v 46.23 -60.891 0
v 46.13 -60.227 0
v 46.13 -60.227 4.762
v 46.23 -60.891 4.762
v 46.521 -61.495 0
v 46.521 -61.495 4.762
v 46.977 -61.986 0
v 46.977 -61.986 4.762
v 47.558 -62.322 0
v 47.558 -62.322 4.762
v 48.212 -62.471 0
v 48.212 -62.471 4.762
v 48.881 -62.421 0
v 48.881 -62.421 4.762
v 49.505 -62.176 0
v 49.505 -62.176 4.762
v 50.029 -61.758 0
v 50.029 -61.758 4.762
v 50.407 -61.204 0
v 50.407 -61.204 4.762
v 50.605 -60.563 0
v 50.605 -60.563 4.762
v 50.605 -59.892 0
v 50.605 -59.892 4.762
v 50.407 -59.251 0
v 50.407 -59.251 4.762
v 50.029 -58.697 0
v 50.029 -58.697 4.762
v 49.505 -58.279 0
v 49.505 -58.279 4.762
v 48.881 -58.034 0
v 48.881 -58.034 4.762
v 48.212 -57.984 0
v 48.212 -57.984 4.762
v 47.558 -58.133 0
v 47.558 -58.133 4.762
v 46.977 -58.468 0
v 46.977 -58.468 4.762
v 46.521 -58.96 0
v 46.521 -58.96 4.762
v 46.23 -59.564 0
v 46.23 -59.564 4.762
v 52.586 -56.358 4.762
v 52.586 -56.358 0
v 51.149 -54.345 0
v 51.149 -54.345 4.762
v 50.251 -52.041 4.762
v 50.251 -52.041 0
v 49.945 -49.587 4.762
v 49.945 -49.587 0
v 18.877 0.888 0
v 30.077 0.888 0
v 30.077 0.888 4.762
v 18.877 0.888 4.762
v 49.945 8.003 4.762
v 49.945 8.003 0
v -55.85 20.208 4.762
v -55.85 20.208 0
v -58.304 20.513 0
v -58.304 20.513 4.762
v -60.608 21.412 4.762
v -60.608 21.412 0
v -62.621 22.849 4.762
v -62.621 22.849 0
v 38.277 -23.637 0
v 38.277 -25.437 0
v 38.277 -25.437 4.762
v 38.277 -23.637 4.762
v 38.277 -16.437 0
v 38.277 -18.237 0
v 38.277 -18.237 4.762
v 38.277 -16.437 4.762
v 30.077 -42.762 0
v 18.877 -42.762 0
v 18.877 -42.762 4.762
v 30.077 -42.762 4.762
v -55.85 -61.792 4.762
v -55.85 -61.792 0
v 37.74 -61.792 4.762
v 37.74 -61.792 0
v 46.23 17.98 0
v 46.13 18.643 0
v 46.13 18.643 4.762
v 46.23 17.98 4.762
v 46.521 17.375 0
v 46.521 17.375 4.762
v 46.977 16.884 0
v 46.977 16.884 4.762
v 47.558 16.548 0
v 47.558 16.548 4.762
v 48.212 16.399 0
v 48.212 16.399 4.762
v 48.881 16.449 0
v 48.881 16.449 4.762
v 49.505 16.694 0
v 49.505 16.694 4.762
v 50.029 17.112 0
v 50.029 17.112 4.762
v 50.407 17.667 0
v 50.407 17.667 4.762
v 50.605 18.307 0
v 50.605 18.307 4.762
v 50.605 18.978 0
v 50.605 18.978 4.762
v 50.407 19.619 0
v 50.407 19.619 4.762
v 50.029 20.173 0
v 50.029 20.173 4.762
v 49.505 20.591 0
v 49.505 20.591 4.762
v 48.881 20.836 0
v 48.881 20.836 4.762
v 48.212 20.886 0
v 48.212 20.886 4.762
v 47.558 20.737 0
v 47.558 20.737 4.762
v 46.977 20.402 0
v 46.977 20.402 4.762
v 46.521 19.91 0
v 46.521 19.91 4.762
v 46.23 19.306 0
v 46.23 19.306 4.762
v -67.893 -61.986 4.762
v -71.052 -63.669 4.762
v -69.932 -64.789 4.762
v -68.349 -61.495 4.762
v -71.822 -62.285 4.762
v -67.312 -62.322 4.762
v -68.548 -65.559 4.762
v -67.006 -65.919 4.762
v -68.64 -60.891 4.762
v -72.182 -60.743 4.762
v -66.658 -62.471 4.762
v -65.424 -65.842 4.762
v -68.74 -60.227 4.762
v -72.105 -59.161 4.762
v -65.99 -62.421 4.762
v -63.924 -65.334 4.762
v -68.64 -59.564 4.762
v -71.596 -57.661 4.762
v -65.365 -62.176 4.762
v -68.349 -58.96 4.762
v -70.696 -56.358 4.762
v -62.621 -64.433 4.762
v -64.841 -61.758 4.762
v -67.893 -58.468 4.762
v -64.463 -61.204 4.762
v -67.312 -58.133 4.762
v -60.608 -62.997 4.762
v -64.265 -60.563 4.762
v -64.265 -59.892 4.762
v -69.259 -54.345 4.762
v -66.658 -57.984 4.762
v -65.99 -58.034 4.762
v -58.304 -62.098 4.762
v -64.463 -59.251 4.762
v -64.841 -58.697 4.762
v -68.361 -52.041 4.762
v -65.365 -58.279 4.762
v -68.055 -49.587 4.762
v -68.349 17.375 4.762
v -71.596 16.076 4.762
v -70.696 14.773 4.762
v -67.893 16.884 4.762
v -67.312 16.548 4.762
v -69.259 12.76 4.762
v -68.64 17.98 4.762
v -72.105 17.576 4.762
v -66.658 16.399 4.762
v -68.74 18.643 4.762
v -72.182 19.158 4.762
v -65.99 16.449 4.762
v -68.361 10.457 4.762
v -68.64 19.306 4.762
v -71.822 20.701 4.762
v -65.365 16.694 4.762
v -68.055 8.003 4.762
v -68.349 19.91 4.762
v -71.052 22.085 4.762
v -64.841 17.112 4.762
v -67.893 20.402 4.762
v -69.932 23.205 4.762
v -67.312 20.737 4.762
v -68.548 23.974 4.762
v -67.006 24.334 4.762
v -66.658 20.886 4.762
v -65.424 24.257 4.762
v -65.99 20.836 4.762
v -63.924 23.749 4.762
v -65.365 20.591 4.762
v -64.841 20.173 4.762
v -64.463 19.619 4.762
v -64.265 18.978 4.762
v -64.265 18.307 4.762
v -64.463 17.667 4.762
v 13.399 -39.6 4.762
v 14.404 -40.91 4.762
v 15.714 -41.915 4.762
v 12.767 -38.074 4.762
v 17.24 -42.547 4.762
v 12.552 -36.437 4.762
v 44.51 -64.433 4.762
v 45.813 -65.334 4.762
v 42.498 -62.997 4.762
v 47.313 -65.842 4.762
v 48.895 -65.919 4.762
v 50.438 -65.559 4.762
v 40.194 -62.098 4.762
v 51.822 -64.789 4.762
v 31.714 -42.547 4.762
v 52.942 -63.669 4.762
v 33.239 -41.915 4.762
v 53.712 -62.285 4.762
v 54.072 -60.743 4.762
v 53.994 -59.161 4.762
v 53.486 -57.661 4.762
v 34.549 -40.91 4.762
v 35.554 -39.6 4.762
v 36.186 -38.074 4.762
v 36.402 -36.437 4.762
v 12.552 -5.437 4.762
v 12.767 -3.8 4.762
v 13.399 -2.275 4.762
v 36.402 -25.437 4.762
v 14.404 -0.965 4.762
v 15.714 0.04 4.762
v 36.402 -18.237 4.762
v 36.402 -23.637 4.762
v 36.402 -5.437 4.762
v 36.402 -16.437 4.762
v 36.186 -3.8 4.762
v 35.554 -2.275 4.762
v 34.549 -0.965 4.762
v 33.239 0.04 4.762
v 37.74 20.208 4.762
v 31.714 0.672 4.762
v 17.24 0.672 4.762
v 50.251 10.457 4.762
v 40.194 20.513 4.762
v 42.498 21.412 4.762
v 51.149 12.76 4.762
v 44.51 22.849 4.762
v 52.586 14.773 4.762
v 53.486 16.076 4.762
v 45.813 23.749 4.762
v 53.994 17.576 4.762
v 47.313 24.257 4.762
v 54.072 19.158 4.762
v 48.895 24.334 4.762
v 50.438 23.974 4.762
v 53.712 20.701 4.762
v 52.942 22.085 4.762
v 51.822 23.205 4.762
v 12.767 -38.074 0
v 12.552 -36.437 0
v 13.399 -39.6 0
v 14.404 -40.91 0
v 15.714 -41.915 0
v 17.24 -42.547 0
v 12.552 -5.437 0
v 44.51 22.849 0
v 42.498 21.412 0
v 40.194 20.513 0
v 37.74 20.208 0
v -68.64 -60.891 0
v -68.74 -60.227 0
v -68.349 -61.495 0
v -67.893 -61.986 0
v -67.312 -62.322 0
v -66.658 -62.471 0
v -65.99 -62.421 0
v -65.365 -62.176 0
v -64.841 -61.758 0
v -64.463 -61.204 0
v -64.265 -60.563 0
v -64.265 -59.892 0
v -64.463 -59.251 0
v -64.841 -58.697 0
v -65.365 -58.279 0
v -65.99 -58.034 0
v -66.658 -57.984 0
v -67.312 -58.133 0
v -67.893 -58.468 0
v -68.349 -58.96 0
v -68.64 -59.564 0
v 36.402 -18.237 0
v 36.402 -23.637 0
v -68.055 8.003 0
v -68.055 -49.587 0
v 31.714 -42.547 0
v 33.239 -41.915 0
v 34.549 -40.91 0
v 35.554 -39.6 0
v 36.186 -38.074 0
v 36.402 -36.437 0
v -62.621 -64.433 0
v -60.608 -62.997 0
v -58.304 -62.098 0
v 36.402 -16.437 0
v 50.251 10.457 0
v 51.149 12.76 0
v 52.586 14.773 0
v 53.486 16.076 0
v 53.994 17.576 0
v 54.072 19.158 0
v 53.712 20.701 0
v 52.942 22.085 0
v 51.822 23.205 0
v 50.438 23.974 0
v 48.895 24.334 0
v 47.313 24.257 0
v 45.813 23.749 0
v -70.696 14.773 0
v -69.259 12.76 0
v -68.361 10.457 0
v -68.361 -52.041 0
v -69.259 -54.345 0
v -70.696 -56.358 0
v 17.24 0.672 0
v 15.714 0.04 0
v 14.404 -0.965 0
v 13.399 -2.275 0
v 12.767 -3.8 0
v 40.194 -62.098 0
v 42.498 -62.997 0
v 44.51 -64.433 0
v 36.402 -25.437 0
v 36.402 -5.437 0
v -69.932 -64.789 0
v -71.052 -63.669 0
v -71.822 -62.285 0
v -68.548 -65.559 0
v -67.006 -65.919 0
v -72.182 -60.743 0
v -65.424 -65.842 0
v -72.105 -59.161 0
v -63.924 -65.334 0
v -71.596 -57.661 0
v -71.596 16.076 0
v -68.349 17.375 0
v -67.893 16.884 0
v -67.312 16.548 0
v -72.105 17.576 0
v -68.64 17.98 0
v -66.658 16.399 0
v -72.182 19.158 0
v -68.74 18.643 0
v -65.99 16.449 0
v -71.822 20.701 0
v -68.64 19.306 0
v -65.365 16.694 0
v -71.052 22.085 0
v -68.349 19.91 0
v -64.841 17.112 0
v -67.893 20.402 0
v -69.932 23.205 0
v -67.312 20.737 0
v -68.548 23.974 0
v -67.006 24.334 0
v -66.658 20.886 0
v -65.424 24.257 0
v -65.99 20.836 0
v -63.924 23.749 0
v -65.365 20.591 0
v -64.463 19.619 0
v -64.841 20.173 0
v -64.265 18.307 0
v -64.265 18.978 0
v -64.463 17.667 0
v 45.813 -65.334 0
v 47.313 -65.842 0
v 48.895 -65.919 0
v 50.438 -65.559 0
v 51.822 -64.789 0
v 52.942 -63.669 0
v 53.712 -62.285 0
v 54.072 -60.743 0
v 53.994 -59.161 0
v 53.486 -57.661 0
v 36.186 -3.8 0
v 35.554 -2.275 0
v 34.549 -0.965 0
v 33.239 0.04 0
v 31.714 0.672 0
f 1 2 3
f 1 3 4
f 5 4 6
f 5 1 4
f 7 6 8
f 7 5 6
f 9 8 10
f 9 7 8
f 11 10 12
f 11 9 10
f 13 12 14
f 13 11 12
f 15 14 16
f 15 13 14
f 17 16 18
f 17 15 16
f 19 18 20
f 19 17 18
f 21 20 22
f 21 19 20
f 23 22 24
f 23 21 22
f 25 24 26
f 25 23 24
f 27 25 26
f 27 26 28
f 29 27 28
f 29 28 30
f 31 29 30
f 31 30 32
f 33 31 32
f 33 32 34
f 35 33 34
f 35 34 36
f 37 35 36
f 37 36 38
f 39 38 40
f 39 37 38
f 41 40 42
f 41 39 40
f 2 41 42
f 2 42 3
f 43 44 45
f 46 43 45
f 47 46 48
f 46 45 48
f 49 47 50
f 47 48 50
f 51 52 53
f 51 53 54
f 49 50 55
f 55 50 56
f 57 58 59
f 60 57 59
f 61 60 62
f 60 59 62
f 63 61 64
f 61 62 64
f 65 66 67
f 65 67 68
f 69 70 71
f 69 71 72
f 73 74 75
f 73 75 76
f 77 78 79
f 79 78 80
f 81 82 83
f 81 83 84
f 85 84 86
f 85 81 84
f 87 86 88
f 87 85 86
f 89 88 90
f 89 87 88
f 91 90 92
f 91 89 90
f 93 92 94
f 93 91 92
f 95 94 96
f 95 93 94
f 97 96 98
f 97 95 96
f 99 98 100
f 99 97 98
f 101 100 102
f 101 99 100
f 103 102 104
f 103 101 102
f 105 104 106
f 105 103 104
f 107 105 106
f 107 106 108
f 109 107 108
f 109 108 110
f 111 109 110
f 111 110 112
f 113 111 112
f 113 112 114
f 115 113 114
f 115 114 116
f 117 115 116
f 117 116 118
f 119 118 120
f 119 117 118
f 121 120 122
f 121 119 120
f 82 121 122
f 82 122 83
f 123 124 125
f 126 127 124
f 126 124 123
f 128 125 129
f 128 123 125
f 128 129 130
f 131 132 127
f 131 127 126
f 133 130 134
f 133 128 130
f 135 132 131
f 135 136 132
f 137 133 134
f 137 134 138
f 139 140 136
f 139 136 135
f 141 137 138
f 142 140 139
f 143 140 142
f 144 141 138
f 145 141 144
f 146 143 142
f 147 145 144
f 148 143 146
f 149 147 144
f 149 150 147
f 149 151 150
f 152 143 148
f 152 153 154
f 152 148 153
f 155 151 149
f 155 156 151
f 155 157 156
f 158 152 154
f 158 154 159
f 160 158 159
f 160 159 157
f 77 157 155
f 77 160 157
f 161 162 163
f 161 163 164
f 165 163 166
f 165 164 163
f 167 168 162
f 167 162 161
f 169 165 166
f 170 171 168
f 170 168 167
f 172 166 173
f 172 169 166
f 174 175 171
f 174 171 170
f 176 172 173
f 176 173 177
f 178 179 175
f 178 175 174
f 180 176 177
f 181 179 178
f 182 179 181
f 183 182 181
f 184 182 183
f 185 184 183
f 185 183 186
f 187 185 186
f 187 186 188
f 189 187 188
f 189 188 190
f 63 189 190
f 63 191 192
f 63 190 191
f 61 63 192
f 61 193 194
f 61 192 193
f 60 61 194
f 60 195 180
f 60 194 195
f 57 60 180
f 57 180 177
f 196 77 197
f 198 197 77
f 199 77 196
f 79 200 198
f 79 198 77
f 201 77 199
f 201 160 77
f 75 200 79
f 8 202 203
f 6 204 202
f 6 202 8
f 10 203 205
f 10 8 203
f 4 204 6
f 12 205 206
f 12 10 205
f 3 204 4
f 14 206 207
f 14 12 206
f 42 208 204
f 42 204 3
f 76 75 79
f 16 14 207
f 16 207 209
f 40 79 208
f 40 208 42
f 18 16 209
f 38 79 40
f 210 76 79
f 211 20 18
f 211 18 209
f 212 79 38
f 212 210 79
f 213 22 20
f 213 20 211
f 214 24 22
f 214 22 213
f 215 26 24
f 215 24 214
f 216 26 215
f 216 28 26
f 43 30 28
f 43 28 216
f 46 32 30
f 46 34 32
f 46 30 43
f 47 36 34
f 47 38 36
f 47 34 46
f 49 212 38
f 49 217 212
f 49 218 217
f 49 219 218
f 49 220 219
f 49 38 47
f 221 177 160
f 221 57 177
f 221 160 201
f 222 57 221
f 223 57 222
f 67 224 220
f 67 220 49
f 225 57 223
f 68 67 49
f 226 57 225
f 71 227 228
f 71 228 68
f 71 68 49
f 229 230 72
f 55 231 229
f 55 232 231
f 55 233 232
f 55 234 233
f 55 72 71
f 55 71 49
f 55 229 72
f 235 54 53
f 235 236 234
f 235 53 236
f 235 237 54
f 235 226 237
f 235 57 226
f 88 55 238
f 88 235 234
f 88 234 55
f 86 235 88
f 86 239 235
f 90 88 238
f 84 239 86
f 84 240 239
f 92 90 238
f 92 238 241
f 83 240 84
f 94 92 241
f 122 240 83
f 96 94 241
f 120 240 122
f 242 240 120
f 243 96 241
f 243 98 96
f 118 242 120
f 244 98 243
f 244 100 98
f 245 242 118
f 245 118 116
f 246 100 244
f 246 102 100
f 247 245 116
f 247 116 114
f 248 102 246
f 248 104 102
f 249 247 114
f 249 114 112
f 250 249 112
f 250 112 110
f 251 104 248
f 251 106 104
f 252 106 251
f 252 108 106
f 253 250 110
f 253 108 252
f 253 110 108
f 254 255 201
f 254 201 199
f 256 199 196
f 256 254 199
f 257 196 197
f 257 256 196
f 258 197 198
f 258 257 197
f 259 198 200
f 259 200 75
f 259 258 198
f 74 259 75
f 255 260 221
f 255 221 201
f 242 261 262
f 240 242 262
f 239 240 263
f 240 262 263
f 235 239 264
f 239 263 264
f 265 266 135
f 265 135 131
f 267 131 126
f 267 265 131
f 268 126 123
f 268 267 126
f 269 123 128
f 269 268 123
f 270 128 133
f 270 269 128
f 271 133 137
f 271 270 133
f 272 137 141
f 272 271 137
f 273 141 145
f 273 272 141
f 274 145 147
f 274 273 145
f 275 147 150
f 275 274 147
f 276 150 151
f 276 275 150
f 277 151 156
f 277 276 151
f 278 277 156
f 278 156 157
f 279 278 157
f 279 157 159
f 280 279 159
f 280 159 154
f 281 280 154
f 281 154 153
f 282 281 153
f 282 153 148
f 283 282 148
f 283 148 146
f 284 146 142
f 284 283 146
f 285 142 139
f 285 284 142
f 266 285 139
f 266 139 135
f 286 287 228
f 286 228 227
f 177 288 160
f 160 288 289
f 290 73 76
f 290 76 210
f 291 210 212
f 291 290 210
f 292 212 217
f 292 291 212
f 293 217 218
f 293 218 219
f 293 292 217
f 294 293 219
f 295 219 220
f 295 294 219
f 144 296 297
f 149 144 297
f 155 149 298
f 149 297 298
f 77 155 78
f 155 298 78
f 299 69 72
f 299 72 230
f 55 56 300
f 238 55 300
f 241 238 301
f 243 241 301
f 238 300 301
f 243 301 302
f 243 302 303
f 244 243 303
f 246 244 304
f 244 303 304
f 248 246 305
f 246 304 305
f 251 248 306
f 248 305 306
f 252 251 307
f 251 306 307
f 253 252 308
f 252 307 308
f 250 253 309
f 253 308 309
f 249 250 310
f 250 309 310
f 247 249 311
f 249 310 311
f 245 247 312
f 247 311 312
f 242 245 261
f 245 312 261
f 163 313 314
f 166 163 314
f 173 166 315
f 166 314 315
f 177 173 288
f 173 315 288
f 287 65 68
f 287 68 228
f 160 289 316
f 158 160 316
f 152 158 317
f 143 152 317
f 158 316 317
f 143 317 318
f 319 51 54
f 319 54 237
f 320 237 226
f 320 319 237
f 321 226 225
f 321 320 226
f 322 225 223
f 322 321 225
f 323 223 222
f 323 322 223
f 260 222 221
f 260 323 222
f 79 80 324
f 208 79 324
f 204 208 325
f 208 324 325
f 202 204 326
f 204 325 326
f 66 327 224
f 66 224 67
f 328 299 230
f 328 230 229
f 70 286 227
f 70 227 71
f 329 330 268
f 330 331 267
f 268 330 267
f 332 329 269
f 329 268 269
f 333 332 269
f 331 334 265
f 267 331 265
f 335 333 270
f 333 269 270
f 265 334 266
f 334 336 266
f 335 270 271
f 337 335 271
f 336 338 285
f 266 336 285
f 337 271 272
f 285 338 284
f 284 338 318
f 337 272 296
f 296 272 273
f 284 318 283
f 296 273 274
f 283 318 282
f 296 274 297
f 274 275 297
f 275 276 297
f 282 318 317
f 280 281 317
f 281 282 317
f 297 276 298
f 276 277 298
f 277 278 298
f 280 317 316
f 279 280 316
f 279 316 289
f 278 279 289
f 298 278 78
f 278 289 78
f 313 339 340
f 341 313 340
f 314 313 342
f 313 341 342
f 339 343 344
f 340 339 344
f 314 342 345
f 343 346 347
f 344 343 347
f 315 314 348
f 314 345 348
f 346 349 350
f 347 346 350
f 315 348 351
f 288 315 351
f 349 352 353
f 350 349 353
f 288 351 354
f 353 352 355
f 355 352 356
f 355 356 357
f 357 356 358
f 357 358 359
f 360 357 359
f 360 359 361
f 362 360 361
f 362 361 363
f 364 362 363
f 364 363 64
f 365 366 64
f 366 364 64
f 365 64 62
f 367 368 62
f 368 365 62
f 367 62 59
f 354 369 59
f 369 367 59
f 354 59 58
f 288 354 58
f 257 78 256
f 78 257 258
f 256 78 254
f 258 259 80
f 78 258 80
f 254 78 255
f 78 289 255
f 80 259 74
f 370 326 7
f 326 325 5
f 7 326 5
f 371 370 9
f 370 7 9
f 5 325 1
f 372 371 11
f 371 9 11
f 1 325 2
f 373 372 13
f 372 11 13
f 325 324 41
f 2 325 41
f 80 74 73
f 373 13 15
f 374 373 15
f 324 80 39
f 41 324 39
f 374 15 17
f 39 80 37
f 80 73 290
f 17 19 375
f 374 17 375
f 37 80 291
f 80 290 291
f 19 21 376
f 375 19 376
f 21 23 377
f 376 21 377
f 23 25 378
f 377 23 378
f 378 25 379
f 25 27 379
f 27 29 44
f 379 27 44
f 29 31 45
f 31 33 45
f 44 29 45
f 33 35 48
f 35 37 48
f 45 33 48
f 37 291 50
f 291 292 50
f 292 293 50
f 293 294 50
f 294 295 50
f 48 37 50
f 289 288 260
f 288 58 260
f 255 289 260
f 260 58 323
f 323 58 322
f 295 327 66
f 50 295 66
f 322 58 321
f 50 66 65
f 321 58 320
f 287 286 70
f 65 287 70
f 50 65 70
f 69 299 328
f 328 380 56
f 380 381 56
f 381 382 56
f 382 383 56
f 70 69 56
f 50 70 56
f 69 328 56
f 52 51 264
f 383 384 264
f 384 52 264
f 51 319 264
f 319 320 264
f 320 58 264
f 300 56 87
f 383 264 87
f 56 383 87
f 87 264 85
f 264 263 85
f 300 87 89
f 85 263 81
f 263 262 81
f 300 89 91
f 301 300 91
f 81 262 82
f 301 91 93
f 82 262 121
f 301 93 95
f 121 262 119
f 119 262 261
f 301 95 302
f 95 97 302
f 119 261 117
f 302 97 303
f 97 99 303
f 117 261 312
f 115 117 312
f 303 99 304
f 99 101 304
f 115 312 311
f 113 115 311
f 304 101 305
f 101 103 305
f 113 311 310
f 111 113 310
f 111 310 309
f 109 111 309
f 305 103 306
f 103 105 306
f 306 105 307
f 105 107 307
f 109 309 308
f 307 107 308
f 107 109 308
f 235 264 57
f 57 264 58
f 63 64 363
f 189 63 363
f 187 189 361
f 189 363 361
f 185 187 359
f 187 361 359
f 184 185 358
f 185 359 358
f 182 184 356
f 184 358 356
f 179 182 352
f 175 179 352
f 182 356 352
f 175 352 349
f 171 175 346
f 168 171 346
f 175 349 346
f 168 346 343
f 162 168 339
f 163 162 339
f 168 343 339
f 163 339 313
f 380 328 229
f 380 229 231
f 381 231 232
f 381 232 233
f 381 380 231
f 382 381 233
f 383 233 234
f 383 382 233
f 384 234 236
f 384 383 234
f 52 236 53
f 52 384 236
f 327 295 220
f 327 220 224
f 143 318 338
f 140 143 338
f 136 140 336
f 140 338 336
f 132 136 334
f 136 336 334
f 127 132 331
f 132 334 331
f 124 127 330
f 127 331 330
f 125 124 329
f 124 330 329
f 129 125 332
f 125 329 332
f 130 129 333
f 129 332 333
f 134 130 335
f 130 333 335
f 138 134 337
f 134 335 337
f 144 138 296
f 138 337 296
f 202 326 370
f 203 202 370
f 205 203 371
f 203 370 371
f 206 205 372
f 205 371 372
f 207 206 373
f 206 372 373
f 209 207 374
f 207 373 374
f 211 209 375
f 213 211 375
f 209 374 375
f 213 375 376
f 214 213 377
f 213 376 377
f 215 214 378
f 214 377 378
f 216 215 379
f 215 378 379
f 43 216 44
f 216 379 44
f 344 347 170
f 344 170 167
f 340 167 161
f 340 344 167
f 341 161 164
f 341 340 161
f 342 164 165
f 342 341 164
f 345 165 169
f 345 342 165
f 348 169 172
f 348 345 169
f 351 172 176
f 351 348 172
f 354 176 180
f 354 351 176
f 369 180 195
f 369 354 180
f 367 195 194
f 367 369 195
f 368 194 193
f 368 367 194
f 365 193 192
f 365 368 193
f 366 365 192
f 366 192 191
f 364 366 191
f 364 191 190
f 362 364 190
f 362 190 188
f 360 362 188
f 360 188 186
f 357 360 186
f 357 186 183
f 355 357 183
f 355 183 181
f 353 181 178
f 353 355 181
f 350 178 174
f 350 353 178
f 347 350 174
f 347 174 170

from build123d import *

# Parameters (mm, degrees)
SKETCH2_R           = 2.25
BOSS_EXTRUDE1_DEPTH = 4.7625


with BuildPart() as part:
    # Sketch2 → Boss-Extrude1 (new body)
    with BuildSketch(Plane.XY):
        with BuildLine():
            Line((-68.055152616, 8.002600295), (-68.055152616, -49.587169128))
            ThreePointArc((-68.055152616, -49.587169128), (-68.738717517, -53.22090509), (-70.695960025, -56.35786218))
            ThreePointArc((-70.695960025, -56.35786218), (-70.531296713, -64.268428513), (-62.62073038, -64.433091825))
            ThreePointArc((-62.62073038, -64.433091825), (-59.48377329, -62.475849317), (-55.850037328, -61.792284416))
            Line((-55.850037328, -61.792284416), (37.739732095, -61.792284416))
            ThreePointArc((37.739732095, -61.792284416), (41.373468058, -62.475849317), (44.510425147, -64.433091825))
            ThreePointArc((44.510425147, -64.433091825), (52.420991481, -64.268428513), (52.585654792, -56.35786218))
            ThreePointArc((52.585654792, -56.35786218), (50.628412285, -53.22090509), (49.944847384, -49.587169128))
            Line((49.944847384, -49.587169128), (49.944847384, 8.002600295))
            ThreePointArc((49.944847384, 8.002600295), (50.628412285, 11.636336257), (52.585654792, 14.773293347))
            ThreePointArc((52.585654792, 14.773293347), (52.420991481, 22.683859681), (44.510425147, 22.848522992))
            ThreePointArc((44.510425147, 22.848522992), (41.373468058, 20.891280484), (37.739732095, 20.207715584))
            Line((37.739732095, 20.207715584), (-55.850037328, 20.207715584))
            ThreePointArc((-55.850037328, 20.207715584), (-59.48377329, 20.891280484), (-62.62073038, 22.848522992))
            ThreePointArc((-62.62073038, 22.848522992), (-70.531296713, 22.683859681), (-70.695960025, 14.773293347))
            ThreePointArc((-70.695960025, 14.773293347), (-68.738717517, 11.636336257), (-68.055152616, 8.002600295))
        make_face()
        with Locations(Location((-66.490181459, 18.642744426, 0), (0, 0, 180))):
            Circle(SKETCH2_R, mode=Mode.SUBTRACT)
        with Locations(Location((48.379876226, 18.642744426, 0), (0, 0, 180))):
            Circle(SKETCH2_R, mode=Mode.SUBTRACT)
        with Locations(Location((48.379876226, -60.227313259, 0), (0, 0, 180))):
            Circle(SKETCH2_R, mode=Mode.SUBTRACT)
        with Locations(Location((-66.490181459, -60.227313259, 0), (0, 0, 180))):
            Circle(SKETCH2_R, mode=Mode.SUBTRACT)
        with BuildLine():
            Line((30.076846635, 0.887717024), (18.876846635, 0.88771689))
            ThreePointArc((18.876846635, 0.88771689), (14.404396266, -0.964832772), (12.551846711, -5.437283185))
            Line((12.551846711, -5.437283185), (12.55184708, -36.437283185))
            ThreePointArc((12.55184708, -36.437283185), (14.404396743, -40.909733554), (18.876847156, -42.76228311))
            Line((18.876847156, -42.76228311), (30.076847156, -42.762282976))
            ThreePointArc((30.076847156, -42.762282976), (34.549297525, -40.909733314), (36.40184708, -36.437282901))
            Line((36.40184708, -36.437282901), (36.401846949, -25.437282901))
            Line((36.401846949, -25.437282901), (38.276846863, -25.437282901))
            Line((38.276846863, -25.437282901), (38.276846863, -23.637282901))
            Line((38.276846863, -23.637282901), (36.401846928, -23.637282901))
            Line((36.401846928, -23.637282901), (36.401846863, -18.237282901))
            Line((36.401846863, -18.237282901), (38.276846863, -18.237282879))
            Line((38.276846863, -18.237282879), (38.276846842, -16.437282879))
            Line((38.276846842, -16.437282879), (36.401846842, -16.437282901))
            Line((36.401846842, -16.437282901), (36.401846711, -5.437282901))
            ThreePointArc((36.401846711, -5.437282901), (34.549297048, -0.964832532), (30.076846635, 0.887717024))
        make_face(mode=Mode.SUBTRACT)
    extrude(amount=BOSS_EXTRUDE1_DEPTH)


solid = part.part
